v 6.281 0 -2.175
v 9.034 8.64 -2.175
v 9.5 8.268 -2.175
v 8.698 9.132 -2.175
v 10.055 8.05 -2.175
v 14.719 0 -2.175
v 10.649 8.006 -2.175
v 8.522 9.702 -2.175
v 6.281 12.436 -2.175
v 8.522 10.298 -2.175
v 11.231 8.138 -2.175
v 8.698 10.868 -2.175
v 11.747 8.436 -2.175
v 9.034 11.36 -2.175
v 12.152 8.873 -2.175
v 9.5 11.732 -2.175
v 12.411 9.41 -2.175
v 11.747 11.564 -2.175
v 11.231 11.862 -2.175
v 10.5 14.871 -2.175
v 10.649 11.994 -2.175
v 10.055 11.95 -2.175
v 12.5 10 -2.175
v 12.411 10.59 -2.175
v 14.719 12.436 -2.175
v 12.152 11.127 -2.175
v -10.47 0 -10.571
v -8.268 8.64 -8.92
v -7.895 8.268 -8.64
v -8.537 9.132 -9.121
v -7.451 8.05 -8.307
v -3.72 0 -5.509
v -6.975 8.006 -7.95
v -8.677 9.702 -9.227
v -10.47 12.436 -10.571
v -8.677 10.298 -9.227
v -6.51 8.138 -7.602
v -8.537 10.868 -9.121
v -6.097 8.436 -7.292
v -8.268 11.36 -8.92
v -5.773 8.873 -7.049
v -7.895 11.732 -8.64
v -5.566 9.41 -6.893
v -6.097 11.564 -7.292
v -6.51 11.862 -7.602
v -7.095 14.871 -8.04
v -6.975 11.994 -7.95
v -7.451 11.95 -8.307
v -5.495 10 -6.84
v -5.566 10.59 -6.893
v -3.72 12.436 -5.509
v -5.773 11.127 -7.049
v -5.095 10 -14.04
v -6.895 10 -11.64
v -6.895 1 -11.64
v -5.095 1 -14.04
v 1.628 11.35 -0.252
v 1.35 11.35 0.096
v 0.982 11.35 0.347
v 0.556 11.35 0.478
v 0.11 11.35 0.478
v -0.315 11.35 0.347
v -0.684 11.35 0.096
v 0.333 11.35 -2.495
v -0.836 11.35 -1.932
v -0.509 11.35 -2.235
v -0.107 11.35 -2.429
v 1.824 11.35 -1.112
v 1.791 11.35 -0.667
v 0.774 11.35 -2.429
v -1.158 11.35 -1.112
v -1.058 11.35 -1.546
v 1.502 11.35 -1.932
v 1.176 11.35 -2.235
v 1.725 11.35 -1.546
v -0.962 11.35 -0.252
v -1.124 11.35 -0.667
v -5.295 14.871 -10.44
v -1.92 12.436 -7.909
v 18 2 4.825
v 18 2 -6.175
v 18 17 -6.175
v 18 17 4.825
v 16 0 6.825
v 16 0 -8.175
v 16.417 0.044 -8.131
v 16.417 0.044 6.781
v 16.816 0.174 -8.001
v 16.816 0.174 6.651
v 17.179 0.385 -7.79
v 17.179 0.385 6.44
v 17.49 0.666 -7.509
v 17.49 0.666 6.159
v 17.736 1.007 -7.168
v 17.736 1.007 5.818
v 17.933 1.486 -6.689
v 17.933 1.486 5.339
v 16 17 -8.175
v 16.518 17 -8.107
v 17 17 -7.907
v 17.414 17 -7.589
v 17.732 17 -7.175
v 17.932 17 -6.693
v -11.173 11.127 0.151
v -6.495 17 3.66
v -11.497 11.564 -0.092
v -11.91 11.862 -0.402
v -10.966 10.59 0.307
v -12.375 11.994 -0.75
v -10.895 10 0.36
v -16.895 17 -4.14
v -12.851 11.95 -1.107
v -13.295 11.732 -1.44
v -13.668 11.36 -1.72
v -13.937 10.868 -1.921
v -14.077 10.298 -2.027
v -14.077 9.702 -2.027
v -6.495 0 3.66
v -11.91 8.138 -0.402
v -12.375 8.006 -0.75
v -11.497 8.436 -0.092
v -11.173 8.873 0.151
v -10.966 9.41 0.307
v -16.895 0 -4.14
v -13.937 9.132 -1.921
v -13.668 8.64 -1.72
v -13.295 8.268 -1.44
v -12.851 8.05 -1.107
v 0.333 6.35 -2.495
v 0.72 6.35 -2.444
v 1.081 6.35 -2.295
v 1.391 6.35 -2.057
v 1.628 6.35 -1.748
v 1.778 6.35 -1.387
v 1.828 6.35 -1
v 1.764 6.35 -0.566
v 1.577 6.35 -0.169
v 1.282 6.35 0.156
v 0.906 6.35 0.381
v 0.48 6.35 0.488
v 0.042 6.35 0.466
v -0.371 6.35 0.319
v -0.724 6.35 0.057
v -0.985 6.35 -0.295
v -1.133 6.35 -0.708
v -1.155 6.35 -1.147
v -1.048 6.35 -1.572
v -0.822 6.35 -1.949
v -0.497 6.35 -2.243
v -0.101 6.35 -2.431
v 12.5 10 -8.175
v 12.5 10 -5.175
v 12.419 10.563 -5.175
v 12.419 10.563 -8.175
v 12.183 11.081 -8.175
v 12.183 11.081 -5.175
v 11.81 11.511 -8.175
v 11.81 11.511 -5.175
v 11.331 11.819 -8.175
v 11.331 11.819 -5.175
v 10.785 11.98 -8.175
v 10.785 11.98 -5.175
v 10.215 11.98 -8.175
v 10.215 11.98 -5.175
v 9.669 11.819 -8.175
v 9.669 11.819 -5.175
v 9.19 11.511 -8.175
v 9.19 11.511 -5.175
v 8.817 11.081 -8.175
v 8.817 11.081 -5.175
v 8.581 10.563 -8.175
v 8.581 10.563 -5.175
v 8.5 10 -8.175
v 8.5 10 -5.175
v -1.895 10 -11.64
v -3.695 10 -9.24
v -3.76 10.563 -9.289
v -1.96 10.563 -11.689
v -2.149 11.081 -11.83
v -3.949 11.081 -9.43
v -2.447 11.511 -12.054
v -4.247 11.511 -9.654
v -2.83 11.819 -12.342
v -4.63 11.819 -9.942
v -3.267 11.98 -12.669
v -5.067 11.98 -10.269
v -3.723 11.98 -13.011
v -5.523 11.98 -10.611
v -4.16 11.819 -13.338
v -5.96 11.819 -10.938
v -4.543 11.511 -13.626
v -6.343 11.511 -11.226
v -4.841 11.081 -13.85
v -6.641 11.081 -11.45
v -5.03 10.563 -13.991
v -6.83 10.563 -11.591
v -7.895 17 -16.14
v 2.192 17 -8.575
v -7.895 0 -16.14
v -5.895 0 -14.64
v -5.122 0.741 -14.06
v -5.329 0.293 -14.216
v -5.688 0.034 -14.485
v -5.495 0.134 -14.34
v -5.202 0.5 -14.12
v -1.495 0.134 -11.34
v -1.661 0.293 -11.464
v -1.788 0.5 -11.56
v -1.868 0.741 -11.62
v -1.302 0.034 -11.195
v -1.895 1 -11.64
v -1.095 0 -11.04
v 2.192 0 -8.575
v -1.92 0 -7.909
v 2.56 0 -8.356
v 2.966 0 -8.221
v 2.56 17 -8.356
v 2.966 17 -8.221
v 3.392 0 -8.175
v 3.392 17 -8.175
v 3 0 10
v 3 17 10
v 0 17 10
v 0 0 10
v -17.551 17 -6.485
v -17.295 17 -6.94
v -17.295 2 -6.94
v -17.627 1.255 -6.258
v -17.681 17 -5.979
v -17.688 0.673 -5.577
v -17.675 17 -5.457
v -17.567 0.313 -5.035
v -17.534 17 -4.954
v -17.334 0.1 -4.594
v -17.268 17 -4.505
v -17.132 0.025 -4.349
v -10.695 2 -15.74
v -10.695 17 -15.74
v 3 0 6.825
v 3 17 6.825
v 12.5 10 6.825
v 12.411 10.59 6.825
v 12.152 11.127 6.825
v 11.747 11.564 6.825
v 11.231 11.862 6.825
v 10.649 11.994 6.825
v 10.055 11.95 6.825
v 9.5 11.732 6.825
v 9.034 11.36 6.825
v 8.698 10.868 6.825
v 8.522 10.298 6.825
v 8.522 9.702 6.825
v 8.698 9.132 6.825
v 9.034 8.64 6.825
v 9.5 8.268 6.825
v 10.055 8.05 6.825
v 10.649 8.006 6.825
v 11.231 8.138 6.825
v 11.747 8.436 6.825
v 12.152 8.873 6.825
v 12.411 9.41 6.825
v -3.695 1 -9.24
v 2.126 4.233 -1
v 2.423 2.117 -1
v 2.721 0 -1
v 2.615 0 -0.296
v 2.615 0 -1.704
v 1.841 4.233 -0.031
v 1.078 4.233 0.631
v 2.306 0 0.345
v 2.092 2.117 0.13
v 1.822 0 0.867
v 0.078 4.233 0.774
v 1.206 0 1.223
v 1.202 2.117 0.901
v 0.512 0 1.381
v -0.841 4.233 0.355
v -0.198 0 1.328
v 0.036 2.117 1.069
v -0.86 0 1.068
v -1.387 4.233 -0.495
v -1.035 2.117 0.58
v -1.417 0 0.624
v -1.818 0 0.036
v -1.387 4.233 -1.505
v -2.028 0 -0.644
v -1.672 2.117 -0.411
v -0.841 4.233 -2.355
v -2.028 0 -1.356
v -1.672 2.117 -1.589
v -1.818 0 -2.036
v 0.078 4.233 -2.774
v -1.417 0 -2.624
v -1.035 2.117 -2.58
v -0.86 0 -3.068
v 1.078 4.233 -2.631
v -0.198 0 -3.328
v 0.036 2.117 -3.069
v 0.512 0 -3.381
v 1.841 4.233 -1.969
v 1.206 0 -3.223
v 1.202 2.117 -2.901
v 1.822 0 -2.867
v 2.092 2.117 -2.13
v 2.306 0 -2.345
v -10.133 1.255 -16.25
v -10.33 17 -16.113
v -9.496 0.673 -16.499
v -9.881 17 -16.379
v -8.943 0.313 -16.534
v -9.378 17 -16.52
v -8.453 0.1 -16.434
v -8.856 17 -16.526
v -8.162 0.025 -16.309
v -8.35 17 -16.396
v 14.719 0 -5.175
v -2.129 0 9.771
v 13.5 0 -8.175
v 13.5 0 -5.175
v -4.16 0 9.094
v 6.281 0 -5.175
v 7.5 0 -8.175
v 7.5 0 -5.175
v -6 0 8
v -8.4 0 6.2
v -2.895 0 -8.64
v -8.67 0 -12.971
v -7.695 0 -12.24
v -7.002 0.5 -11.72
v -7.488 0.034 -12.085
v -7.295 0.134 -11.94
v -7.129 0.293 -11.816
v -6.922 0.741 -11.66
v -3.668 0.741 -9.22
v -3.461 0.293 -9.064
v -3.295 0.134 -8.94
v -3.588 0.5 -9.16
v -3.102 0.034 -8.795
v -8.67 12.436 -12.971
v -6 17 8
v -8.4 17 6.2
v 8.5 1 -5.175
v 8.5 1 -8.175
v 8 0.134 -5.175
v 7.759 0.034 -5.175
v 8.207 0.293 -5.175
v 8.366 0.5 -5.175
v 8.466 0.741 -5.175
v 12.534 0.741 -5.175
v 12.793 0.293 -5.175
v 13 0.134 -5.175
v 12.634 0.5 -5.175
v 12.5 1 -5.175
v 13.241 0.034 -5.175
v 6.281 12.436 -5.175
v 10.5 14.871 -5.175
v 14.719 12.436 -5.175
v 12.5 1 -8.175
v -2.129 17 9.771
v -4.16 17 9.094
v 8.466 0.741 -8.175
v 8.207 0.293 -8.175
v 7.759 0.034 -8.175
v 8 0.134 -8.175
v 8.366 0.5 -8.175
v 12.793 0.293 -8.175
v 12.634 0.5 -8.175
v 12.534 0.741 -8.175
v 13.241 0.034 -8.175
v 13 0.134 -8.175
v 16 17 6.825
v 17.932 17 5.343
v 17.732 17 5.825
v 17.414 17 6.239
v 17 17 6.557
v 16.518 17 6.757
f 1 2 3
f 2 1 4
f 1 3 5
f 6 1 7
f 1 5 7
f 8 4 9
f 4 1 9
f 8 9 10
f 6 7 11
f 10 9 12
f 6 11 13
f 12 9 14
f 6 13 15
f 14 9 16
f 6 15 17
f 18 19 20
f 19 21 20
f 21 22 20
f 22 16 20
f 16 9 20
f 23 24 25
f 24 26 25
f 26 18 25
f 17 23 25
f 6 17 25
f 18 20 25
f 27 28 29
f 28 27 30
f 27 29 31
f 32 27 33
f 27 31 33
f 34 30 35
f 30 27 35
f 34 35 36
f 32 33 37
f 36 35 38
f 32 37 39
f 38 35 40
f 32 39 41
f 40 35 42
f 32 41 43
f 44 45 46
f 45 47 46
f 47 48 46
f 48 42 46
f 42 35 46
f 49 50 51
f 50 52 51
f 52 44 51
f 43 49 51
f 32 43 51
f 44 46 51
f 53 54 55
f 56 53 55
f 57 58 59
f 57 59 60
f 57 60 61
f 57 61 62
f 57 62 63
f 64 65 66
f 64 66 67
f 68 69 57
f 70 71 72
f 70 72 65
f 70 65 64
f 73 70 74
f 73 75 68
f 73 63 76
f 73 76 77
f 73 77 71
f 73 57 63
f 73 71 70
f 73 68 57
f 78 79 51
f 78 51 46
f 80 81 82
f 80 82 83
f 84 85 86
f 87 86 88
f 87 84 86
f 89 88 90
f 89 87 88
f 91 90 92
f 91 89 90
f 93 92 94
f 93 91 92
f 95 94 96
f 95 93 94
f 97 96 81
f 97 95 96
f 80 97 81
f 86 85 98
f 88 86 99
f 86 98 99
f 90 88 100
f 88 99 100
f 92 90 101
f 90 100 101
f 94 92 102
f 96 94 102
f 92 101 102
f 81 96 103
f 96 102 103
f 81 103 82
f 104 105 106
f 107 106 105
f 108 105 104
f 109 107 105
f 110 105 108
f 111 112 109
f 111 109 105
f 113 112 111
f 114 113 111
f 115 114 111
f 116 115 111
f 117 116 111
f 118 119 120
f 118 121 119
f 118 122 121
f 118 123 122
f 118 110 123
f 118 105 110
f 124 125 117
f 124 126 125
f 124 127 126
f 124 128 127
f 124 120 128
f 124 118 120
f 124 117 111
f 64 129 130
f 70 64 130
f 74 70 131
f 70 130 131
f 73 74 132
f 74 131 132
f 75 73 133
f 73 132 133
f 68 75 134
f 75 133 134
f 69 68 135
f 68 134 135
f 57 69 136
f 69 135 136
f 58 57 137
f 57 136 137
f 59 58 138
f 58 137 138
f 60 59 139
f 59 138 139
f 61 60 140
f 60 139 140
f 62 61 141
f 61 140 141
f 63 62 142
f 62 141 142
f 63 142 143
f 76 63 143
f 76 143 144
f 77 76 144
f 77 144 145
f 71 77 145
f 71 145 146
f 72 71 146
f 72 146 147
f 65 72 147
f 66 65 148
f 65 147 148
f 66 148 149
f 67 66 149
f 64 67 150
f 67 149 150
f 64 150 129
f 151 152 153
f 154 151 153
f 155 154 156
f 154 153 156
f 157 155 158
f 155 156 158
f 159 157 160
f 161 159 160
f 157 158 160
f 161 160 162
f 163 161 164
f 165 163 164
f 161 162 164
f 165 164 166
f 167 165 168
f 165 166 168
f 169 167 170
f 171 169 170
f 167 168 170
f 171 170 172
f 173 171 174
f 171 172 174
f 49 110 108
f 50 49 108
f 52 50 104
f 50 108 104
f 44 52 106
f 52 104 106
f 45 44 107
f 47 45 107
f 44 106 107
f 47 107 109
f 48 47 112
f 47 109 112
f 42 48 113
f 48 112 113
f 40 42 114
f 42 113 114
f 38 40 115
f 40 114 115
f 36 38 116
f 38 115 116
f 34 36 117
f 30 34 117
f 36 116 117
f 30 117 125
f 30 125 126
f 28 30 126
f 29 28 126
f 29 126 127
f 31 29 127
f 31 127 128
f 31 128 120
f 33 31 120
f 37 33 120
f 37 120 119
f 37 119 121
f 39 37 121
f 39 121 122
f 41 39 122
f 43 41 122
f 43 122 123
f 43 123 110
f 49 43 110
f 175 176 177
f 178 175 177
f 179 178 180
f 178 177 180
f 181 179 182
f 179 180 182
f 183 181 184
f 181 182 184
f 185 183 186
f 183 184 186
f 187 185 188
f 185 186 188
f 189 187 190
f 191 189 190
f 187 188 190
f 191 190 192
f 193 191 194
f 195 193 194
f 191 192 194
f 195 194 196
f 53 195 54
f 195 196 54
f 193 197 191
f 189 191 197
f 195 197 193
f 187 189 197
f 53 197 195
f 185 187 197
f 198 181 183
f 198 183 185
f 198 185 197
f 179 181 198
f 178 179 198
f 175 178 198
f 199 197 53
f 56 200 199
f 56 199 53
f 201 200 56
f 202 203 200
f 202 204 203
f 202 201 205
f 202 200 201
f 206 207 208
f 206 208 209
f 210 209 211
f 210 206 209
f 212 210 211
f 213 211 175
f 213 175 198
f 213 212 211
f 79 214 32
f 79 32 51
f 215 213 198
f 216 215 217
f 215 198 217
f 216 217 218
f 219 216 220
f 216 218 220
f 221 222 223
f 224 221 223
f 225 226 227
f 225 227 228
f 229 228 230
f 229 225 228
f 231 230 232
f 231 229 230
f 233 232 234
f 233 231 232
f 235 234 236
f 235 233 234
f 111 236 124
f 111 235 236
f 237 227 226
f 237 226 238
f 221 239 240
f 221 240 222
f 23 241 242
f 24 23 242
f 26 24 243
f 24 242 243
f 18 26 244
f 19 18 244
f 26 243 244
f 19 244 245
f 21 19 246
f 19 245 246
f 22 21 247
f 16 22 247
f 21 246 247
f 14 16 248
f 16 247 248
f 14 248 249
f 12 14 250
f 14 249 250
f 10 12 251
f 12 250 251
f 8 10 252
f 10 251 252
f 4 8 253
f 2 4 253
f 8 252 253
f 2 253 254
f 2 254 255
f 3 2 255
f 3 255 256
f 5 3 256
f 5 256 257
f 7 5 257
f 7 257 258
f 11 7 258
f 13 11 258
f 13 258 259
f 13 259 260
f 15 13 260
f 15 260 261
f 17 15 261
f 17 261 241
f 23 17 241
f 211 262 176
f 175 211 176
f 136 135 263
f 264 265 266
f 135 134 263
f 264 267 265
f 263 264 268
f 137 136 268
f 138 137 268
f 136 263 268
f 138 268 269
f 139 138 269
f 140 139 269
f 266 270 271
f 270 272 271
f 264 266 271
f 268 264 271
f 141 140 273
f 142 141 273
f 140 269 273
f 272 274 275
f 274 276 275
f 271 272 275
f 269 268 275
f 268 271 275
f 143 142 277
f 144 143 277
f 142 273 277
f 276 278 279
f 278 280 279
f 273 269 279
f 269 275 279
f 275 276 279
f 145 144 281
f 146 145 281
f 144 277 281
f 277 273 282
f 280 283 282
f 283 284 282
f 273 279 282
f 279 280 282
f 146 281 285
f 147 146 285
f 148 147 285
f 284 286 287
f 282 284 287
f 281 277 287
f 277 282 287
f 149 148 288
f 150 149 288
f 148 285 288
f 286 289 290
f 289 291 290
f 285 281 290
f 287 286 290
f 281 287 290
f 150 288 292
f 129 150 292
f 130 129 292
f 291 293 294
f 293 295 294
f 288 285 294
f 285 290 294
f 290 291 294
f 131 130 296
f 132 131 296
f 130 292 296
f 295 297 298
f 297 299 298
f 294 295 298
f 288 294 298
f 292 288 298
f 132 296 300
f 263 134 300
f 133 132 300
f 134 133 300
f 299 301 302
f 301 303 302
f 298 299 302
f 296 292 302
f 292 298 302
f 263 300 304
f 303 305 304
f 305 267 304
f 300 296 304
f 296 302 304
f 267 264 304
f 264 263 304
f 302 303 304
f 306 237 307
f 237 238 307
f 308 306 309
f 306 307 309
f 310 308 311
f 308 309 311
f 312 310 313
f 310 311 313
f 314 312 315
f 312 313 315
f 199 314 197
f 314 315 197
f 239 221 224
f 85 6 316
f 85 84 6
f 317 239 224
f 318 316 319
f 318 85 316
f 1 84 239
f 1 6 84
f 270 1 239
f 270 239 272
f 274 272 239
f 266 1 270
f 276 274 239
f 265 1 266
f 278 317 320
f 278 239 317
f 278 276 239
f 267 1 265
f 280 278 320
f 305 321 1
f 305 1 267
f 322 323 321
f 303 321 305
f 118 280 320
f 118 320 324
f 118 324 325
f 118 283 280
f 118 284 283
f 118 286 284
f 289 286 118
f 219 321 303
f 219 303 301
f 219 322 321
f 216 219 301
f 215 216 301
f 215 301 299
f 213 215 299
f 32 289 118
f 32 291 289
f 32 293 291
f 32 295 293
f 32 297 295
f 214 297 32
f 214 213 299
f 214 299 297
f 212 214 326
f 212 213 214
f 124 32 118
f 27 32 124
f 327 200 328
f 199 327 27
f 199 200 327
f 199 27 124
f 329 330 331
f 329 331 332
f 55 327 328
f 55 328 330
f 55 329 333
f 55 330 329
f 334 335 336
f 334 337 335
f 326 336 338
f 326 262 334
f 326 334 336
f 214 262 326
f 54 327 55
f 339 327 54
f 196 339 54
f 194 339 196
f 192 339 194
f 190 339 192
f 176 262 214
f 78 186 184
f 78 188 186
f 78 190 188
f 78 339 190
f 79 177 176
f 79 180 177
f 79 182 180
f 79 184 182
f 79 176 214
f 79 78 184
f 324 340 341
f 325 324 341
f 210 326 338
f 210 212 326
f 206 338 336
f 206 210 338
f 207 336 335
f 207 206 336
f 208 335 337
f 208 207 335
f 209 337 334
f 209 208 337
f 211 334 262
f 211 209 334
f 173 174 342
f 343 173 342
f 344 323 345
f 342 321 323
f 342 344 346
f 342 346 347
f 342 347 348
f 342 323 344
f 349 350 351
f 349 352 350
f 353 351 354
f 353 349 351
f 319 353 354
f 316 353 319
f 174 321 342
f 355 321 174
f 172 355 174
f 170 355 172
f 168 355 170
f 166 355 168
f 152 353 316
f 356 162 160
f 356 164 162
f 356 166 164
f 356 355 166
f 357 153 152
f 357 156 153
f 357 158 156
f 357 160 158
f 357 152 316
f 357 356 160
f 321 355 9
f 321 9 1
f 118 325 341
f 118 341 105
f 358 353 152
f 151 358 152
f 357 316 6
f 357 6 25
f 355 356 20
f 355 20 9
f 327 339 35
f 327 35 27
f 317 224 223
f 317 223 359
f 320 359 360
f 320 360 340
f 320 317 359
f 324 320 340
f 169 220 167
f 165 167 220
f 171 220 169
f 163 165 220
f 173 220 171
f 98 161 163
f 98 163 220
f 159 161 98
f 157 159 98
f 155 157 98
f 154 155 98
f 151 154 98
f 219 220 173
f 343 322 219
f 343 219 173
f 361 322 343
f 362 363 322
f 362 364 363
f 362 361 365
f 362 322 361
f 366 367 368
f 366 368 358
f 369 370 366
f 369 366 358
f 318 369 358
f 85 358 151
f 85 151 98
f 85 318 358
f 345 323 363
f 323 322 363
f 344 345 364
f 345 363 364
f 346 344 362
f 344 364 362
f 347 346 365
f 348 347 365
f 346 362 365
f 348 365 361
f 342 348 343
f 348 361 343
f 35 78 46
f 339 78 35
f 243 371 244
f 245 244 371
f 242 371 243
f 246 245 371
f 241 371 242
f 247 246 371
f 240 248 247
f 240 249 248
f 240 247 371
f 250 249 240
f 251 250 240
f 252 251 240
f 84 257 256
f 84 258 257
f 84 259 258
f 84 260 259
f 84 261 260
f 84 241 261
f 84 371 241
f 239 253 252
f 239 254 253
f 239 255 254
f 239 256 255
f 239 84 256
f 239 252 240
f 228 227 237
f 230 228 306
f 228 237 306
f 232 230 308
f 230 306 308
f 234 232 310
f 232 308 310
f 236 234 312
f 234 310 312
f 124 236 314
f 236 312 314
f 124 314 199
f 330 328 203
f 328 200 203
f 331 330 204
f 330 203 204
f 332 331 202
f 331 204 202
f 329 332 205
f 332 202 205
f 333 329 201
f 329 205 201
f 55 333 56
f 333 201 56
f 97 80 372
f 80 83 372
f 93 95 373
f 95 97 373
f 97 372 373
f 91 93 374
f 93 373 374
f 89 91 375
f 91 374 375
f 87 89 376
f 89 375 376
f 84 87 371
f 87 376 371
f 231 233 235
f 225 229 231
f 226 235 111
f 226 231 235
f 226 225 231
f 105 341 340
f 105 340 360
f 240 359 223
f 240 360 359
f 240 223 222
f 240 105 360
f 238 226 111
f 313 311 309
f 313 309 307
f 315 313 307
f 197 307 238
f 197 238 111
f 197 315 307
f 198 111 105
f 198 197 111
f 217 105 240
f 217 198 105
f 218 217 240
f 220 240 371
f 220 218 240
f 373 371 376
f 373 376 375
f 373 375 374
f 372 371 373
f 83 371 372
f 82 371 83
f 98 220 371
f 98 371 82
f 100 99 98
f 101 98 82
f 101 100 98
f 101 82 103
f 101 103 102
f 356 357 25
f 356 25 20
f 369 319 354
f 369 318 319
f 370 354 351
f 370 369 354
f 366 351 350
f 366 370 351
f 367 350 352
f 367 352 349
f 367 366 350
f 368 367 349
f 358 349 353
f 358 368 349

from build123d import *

# Parameters (mm, degrees)
BOSS_EXTRUDE1_DEPTH = 70
SKETCH2_R           = 2
CUT_EXTRUDE1_DEPTH  = 15
SKETCH3_R           = 2
CUT_EXTRUDE2_DEPTH  = 15
CUT_EXTRUDE3_START  = -3
CUT_EXTRUDE3_DEPTH  = 3
CUT_EXTRUDE4_START  = -3
CUT_EXTRUDE4_DEPTH  = 3
FILLET1_R           = 2
SKETCH8_W           = 45.954012469
SKETCH8_H           = 31.924176852
CUT_EXTRUDE6_DEPTH  = 53
CUT_EXTRUDE7_START  = -3
CUT_EXTRUDE7_DEPTH  = 3
CUT_EXTRUDE8_START  = -3
CUT_EXTRUDE8_DEPTH  = 3
SKETCH11_R          = 2.3876
CUT_EXTRUDE9_DEPTH  = 6.35
CUT_EXTRUDE9_DRAFT  = -8
SKETCH12_R          = 1.4951657
CUT_EXTRUDE10_DEPTH = 5
FILLET2_R           = 1


with BuildPart() as part:
    # Sketch1 → Boss-Extrude1 (new body)
    with BuildSketch(Plane(origin=(0, 0, 0), x_dir=(1, 0, 0), z_dir=(0, 1, 0))):
        with BuildLine():
            Line((-18.495, 5.34), (-9.495, 17.34))
            Line((-9.495, 17.34), (2.725, 8.175))
            Line((2.725, 8.175), (18, 8.175))
            Line((18, 8.175), (18, -6.825))
            Line((18, -6.825), (3, -6.825))
            Line((3, -6.825), (3, -10))
            Line((3, -10), (0, -10))
            ThreePointArc((0, -10), (-3.16227766, -9.486832981), (-6, -8))
            Line((-6, -8), (-8.4, -6.2))
            Line((-8.4, -6.2), (-6.495, -3.66))
            Line((-6.495, -3.66), (-18.495, 5.34))
        make_face()
    extrude(amount=BOSS_EXTRUDE1_DEPTH)

    # Sketch2 → Cut-Extrude1 (cut)
    with BuildSketch(Plane.XY.offset(6.825)):
        with Locations((10.5, 10)):
            Circle(SKETCH2_R)
        with Locations((10.5, 60)):
            Circle(SKETCH2_R)
    extrude(amount=-CUT_EXTRUDE1_DEPTH, mode=Mode.SUBTRACT)

    # Sketch3 → Cut-Extrude2 (cut)
    with BuildSketch(Plane(origin=(-4.095, 0, 5.46), x_dir=(0.8000000000000002, 0, 0.5999999999999999), z_dir=(-0.5999999999999999, 0, 0.8000000000000003))):
        with Locations((-10.5, 10)):
            Circle(SKETCH3_R)
        with Locations((-10.5, 60)):
            Circle(SKETCH3_R)
    extrude(amount=-CUT_EXTRUDE2_DEPTH, mode=Mode.SUBTRACT)

    # Sketch4 → Cut-Extrude3 (cut)
    with BuildSketch(Plane(origin=(4.905, 0, -6.54), x_dir=(-0.8000000000000002, 0, -0.5999999999999998), z_dir=(0.5999999999999998, 0, -0.8000000000000002)).offset(CUT_EXTRUDE3_START)):
        Polygon((6.28125, 12.435696448), (10.5, 14.871392896), (14.71875, 12.435696448), (14.71875, 0), (6.28125, 0), align=None)
        Polygon((10.5, 55.128607104), (14.71875, 57.564303552), (14.71875, 62.435696448), (10.5, 64.871392896), (6.28125, 62.435696448), (6.28125, 57.564303552), align=None)
    extrude(amount=-CUT_EXTRUDE3_DEPTH, mode=Mode.SUBTRACT)

    # Sketch5 → Cut-Extrude4 (cut)
    with BuildSketch(Plane(origin=(0, 0, -8.175), x_dir=(-1, 0, 0), z_dir=(0, 0, -1)).offset(CUT_EXTRUDE4_START)):
        Polygon((-14.71875, 12.435696448), (-10.5, 14.871392896), (-6.28125, 12.435696448), (-6.28125, 0), (-14.71875, 0), align=None)
        Polygon((-10.5, 55.128607104), (-6.28125, 57.564303552), (-6.28125, 62.435696448), (-10.5, 64.871392896), (-14.71875, 62.435696448), (-14.71875, 57.564303552), align=None)
    extrude(amount=-CUT_EXTRUDE4_DEPTH, mode=Mode.SUBTRACT)

    # Fillet1
    fillet1_edges = [part.edges().sort_by_distance(p)[0] for p in [
        (-13.995, 0, -11.34),
        (18, 0, -0.675),
        (-18.495, 35, -5.34),
        (-9.495, 35, -17.34),
        (2.725, 35, -8.175),
        (18, 35, -8.175),
        (18, 35, 6.825),
    ]]
    fillet(fillet1_edges, radius=FILLET1_R)

    # Sketch8 → Cut-Extrude6 (cut)
    with BuildSketch(Plane(origin=(0, 70, 0), x_dir=(1, 0, 0), z_dir=(0, 1, 0))):
        with Locations((-0.294273389, 3.101020579)):
            Rectangle(SKETCH8_W, SKETCH8_H)
    extrude(amount=-CUT_EXTRUDE6_DEPTH, mode=Mode.SUBTRACT)

    # Sketch9 → Cut-Extrude7 (cut)
    with BuildSketch(Plane(origin=(4.905, 0, -6.54), x_dir=(-0.8000000000000002, 0, -0.5999999999999998), z_dir=(0.5999999999999998, 0, -0.8000000000000002)).offset(CUT_EXTRUDE7_START)):
        with BuildLine():
            Line((12.5, 10), (12.5, 0))
            Line((12.5, 0), (8.5, 0))
            Line((8.5, 0), (8.5, 10))
            ThreePointArc((8.5, 10), (10.5, 8), (12.5, 10))
        make_face()
    extrude(amount=CUT_EXTRUDE7_DEPTH, mode=Mode.SUBTRACT)

    # Sketch10 → Cut-Extrude8 (cut)
    with BuildSketch(Plane(origin=(0, 0, -8.175), x_dir=(-1, 0, 0), z_dir=(0, 0, -1)).offset(CUT_EXTRUDE8_START)):
        with BuildLine():
            Line((-8.5, 10), (-8.5, 0))
            Line((-8.5, 0), (-12.5, 0))
            Line((-12.5, 0), (-12.5, 10))
            ThreePointArc((-12.5, 10), (-10.5, 8), (-8.5, 10))
        make_face()
    extrude(amount=CUT_EXTRUDE8_DEPTH, mode=Mode.SUBTRACT)


with BuildPart() as cut_extrude9_tool:
    # Sketch11 → Cut-Extrude9 (with draft: the straight prism first)
    with BuildSketch(Plane.XZ):
        with Locations((0.333333333, -1)):
            Circle(SKETCH11_R)
    extrude(amount=-CUT_EXTRUDE9_DEPTH)
    # Cut-Extrude9: the draft: its side faces are tilted about the plane it starts from
    cut_extrude9_sides = [cut_extrude9_tool.faces().sort_by_distance(p)[0] for p in [
        (-2.054266667, 3.175, -1),
    ]]
    draft(cut_extrude9_sides, Plane.XZ, CUT_EXTRUDE9_DRAFT)


with BuildPart() as part_1:
    add(part.part)

    # Cut-Extrude9: cut by cut_extrude9_tool
    add(cut_extrude9_tool.part, mode=Mode.SUBTRACT)

    # Sketch12 → Cut-Extrude10 (cut)
    with BuildSketch(Plane.XZ.offset(-6.35)):
        with Locations(Location((0.333333333, -1, 0), (0, 0, 270))):
            Circle(SKETCH12_R)
    extrude(amount=-CUT_EXTRUDE10_DEPTH, mode=Mode.SUBTRACT)

    # Fillet2
    fillet2_edges = [part_1.edges().sort_by_distance(p)[0] for p in [
        (-5.995, 0, -12.84),
        (-2.795, 0, -10.44),
        (8.5, 0, -6.675),
        (12.5, 0, -6.675),
    ]]
    fillet(fillet2_edges, radius=FILLET2_R)


solid = part_1.part
